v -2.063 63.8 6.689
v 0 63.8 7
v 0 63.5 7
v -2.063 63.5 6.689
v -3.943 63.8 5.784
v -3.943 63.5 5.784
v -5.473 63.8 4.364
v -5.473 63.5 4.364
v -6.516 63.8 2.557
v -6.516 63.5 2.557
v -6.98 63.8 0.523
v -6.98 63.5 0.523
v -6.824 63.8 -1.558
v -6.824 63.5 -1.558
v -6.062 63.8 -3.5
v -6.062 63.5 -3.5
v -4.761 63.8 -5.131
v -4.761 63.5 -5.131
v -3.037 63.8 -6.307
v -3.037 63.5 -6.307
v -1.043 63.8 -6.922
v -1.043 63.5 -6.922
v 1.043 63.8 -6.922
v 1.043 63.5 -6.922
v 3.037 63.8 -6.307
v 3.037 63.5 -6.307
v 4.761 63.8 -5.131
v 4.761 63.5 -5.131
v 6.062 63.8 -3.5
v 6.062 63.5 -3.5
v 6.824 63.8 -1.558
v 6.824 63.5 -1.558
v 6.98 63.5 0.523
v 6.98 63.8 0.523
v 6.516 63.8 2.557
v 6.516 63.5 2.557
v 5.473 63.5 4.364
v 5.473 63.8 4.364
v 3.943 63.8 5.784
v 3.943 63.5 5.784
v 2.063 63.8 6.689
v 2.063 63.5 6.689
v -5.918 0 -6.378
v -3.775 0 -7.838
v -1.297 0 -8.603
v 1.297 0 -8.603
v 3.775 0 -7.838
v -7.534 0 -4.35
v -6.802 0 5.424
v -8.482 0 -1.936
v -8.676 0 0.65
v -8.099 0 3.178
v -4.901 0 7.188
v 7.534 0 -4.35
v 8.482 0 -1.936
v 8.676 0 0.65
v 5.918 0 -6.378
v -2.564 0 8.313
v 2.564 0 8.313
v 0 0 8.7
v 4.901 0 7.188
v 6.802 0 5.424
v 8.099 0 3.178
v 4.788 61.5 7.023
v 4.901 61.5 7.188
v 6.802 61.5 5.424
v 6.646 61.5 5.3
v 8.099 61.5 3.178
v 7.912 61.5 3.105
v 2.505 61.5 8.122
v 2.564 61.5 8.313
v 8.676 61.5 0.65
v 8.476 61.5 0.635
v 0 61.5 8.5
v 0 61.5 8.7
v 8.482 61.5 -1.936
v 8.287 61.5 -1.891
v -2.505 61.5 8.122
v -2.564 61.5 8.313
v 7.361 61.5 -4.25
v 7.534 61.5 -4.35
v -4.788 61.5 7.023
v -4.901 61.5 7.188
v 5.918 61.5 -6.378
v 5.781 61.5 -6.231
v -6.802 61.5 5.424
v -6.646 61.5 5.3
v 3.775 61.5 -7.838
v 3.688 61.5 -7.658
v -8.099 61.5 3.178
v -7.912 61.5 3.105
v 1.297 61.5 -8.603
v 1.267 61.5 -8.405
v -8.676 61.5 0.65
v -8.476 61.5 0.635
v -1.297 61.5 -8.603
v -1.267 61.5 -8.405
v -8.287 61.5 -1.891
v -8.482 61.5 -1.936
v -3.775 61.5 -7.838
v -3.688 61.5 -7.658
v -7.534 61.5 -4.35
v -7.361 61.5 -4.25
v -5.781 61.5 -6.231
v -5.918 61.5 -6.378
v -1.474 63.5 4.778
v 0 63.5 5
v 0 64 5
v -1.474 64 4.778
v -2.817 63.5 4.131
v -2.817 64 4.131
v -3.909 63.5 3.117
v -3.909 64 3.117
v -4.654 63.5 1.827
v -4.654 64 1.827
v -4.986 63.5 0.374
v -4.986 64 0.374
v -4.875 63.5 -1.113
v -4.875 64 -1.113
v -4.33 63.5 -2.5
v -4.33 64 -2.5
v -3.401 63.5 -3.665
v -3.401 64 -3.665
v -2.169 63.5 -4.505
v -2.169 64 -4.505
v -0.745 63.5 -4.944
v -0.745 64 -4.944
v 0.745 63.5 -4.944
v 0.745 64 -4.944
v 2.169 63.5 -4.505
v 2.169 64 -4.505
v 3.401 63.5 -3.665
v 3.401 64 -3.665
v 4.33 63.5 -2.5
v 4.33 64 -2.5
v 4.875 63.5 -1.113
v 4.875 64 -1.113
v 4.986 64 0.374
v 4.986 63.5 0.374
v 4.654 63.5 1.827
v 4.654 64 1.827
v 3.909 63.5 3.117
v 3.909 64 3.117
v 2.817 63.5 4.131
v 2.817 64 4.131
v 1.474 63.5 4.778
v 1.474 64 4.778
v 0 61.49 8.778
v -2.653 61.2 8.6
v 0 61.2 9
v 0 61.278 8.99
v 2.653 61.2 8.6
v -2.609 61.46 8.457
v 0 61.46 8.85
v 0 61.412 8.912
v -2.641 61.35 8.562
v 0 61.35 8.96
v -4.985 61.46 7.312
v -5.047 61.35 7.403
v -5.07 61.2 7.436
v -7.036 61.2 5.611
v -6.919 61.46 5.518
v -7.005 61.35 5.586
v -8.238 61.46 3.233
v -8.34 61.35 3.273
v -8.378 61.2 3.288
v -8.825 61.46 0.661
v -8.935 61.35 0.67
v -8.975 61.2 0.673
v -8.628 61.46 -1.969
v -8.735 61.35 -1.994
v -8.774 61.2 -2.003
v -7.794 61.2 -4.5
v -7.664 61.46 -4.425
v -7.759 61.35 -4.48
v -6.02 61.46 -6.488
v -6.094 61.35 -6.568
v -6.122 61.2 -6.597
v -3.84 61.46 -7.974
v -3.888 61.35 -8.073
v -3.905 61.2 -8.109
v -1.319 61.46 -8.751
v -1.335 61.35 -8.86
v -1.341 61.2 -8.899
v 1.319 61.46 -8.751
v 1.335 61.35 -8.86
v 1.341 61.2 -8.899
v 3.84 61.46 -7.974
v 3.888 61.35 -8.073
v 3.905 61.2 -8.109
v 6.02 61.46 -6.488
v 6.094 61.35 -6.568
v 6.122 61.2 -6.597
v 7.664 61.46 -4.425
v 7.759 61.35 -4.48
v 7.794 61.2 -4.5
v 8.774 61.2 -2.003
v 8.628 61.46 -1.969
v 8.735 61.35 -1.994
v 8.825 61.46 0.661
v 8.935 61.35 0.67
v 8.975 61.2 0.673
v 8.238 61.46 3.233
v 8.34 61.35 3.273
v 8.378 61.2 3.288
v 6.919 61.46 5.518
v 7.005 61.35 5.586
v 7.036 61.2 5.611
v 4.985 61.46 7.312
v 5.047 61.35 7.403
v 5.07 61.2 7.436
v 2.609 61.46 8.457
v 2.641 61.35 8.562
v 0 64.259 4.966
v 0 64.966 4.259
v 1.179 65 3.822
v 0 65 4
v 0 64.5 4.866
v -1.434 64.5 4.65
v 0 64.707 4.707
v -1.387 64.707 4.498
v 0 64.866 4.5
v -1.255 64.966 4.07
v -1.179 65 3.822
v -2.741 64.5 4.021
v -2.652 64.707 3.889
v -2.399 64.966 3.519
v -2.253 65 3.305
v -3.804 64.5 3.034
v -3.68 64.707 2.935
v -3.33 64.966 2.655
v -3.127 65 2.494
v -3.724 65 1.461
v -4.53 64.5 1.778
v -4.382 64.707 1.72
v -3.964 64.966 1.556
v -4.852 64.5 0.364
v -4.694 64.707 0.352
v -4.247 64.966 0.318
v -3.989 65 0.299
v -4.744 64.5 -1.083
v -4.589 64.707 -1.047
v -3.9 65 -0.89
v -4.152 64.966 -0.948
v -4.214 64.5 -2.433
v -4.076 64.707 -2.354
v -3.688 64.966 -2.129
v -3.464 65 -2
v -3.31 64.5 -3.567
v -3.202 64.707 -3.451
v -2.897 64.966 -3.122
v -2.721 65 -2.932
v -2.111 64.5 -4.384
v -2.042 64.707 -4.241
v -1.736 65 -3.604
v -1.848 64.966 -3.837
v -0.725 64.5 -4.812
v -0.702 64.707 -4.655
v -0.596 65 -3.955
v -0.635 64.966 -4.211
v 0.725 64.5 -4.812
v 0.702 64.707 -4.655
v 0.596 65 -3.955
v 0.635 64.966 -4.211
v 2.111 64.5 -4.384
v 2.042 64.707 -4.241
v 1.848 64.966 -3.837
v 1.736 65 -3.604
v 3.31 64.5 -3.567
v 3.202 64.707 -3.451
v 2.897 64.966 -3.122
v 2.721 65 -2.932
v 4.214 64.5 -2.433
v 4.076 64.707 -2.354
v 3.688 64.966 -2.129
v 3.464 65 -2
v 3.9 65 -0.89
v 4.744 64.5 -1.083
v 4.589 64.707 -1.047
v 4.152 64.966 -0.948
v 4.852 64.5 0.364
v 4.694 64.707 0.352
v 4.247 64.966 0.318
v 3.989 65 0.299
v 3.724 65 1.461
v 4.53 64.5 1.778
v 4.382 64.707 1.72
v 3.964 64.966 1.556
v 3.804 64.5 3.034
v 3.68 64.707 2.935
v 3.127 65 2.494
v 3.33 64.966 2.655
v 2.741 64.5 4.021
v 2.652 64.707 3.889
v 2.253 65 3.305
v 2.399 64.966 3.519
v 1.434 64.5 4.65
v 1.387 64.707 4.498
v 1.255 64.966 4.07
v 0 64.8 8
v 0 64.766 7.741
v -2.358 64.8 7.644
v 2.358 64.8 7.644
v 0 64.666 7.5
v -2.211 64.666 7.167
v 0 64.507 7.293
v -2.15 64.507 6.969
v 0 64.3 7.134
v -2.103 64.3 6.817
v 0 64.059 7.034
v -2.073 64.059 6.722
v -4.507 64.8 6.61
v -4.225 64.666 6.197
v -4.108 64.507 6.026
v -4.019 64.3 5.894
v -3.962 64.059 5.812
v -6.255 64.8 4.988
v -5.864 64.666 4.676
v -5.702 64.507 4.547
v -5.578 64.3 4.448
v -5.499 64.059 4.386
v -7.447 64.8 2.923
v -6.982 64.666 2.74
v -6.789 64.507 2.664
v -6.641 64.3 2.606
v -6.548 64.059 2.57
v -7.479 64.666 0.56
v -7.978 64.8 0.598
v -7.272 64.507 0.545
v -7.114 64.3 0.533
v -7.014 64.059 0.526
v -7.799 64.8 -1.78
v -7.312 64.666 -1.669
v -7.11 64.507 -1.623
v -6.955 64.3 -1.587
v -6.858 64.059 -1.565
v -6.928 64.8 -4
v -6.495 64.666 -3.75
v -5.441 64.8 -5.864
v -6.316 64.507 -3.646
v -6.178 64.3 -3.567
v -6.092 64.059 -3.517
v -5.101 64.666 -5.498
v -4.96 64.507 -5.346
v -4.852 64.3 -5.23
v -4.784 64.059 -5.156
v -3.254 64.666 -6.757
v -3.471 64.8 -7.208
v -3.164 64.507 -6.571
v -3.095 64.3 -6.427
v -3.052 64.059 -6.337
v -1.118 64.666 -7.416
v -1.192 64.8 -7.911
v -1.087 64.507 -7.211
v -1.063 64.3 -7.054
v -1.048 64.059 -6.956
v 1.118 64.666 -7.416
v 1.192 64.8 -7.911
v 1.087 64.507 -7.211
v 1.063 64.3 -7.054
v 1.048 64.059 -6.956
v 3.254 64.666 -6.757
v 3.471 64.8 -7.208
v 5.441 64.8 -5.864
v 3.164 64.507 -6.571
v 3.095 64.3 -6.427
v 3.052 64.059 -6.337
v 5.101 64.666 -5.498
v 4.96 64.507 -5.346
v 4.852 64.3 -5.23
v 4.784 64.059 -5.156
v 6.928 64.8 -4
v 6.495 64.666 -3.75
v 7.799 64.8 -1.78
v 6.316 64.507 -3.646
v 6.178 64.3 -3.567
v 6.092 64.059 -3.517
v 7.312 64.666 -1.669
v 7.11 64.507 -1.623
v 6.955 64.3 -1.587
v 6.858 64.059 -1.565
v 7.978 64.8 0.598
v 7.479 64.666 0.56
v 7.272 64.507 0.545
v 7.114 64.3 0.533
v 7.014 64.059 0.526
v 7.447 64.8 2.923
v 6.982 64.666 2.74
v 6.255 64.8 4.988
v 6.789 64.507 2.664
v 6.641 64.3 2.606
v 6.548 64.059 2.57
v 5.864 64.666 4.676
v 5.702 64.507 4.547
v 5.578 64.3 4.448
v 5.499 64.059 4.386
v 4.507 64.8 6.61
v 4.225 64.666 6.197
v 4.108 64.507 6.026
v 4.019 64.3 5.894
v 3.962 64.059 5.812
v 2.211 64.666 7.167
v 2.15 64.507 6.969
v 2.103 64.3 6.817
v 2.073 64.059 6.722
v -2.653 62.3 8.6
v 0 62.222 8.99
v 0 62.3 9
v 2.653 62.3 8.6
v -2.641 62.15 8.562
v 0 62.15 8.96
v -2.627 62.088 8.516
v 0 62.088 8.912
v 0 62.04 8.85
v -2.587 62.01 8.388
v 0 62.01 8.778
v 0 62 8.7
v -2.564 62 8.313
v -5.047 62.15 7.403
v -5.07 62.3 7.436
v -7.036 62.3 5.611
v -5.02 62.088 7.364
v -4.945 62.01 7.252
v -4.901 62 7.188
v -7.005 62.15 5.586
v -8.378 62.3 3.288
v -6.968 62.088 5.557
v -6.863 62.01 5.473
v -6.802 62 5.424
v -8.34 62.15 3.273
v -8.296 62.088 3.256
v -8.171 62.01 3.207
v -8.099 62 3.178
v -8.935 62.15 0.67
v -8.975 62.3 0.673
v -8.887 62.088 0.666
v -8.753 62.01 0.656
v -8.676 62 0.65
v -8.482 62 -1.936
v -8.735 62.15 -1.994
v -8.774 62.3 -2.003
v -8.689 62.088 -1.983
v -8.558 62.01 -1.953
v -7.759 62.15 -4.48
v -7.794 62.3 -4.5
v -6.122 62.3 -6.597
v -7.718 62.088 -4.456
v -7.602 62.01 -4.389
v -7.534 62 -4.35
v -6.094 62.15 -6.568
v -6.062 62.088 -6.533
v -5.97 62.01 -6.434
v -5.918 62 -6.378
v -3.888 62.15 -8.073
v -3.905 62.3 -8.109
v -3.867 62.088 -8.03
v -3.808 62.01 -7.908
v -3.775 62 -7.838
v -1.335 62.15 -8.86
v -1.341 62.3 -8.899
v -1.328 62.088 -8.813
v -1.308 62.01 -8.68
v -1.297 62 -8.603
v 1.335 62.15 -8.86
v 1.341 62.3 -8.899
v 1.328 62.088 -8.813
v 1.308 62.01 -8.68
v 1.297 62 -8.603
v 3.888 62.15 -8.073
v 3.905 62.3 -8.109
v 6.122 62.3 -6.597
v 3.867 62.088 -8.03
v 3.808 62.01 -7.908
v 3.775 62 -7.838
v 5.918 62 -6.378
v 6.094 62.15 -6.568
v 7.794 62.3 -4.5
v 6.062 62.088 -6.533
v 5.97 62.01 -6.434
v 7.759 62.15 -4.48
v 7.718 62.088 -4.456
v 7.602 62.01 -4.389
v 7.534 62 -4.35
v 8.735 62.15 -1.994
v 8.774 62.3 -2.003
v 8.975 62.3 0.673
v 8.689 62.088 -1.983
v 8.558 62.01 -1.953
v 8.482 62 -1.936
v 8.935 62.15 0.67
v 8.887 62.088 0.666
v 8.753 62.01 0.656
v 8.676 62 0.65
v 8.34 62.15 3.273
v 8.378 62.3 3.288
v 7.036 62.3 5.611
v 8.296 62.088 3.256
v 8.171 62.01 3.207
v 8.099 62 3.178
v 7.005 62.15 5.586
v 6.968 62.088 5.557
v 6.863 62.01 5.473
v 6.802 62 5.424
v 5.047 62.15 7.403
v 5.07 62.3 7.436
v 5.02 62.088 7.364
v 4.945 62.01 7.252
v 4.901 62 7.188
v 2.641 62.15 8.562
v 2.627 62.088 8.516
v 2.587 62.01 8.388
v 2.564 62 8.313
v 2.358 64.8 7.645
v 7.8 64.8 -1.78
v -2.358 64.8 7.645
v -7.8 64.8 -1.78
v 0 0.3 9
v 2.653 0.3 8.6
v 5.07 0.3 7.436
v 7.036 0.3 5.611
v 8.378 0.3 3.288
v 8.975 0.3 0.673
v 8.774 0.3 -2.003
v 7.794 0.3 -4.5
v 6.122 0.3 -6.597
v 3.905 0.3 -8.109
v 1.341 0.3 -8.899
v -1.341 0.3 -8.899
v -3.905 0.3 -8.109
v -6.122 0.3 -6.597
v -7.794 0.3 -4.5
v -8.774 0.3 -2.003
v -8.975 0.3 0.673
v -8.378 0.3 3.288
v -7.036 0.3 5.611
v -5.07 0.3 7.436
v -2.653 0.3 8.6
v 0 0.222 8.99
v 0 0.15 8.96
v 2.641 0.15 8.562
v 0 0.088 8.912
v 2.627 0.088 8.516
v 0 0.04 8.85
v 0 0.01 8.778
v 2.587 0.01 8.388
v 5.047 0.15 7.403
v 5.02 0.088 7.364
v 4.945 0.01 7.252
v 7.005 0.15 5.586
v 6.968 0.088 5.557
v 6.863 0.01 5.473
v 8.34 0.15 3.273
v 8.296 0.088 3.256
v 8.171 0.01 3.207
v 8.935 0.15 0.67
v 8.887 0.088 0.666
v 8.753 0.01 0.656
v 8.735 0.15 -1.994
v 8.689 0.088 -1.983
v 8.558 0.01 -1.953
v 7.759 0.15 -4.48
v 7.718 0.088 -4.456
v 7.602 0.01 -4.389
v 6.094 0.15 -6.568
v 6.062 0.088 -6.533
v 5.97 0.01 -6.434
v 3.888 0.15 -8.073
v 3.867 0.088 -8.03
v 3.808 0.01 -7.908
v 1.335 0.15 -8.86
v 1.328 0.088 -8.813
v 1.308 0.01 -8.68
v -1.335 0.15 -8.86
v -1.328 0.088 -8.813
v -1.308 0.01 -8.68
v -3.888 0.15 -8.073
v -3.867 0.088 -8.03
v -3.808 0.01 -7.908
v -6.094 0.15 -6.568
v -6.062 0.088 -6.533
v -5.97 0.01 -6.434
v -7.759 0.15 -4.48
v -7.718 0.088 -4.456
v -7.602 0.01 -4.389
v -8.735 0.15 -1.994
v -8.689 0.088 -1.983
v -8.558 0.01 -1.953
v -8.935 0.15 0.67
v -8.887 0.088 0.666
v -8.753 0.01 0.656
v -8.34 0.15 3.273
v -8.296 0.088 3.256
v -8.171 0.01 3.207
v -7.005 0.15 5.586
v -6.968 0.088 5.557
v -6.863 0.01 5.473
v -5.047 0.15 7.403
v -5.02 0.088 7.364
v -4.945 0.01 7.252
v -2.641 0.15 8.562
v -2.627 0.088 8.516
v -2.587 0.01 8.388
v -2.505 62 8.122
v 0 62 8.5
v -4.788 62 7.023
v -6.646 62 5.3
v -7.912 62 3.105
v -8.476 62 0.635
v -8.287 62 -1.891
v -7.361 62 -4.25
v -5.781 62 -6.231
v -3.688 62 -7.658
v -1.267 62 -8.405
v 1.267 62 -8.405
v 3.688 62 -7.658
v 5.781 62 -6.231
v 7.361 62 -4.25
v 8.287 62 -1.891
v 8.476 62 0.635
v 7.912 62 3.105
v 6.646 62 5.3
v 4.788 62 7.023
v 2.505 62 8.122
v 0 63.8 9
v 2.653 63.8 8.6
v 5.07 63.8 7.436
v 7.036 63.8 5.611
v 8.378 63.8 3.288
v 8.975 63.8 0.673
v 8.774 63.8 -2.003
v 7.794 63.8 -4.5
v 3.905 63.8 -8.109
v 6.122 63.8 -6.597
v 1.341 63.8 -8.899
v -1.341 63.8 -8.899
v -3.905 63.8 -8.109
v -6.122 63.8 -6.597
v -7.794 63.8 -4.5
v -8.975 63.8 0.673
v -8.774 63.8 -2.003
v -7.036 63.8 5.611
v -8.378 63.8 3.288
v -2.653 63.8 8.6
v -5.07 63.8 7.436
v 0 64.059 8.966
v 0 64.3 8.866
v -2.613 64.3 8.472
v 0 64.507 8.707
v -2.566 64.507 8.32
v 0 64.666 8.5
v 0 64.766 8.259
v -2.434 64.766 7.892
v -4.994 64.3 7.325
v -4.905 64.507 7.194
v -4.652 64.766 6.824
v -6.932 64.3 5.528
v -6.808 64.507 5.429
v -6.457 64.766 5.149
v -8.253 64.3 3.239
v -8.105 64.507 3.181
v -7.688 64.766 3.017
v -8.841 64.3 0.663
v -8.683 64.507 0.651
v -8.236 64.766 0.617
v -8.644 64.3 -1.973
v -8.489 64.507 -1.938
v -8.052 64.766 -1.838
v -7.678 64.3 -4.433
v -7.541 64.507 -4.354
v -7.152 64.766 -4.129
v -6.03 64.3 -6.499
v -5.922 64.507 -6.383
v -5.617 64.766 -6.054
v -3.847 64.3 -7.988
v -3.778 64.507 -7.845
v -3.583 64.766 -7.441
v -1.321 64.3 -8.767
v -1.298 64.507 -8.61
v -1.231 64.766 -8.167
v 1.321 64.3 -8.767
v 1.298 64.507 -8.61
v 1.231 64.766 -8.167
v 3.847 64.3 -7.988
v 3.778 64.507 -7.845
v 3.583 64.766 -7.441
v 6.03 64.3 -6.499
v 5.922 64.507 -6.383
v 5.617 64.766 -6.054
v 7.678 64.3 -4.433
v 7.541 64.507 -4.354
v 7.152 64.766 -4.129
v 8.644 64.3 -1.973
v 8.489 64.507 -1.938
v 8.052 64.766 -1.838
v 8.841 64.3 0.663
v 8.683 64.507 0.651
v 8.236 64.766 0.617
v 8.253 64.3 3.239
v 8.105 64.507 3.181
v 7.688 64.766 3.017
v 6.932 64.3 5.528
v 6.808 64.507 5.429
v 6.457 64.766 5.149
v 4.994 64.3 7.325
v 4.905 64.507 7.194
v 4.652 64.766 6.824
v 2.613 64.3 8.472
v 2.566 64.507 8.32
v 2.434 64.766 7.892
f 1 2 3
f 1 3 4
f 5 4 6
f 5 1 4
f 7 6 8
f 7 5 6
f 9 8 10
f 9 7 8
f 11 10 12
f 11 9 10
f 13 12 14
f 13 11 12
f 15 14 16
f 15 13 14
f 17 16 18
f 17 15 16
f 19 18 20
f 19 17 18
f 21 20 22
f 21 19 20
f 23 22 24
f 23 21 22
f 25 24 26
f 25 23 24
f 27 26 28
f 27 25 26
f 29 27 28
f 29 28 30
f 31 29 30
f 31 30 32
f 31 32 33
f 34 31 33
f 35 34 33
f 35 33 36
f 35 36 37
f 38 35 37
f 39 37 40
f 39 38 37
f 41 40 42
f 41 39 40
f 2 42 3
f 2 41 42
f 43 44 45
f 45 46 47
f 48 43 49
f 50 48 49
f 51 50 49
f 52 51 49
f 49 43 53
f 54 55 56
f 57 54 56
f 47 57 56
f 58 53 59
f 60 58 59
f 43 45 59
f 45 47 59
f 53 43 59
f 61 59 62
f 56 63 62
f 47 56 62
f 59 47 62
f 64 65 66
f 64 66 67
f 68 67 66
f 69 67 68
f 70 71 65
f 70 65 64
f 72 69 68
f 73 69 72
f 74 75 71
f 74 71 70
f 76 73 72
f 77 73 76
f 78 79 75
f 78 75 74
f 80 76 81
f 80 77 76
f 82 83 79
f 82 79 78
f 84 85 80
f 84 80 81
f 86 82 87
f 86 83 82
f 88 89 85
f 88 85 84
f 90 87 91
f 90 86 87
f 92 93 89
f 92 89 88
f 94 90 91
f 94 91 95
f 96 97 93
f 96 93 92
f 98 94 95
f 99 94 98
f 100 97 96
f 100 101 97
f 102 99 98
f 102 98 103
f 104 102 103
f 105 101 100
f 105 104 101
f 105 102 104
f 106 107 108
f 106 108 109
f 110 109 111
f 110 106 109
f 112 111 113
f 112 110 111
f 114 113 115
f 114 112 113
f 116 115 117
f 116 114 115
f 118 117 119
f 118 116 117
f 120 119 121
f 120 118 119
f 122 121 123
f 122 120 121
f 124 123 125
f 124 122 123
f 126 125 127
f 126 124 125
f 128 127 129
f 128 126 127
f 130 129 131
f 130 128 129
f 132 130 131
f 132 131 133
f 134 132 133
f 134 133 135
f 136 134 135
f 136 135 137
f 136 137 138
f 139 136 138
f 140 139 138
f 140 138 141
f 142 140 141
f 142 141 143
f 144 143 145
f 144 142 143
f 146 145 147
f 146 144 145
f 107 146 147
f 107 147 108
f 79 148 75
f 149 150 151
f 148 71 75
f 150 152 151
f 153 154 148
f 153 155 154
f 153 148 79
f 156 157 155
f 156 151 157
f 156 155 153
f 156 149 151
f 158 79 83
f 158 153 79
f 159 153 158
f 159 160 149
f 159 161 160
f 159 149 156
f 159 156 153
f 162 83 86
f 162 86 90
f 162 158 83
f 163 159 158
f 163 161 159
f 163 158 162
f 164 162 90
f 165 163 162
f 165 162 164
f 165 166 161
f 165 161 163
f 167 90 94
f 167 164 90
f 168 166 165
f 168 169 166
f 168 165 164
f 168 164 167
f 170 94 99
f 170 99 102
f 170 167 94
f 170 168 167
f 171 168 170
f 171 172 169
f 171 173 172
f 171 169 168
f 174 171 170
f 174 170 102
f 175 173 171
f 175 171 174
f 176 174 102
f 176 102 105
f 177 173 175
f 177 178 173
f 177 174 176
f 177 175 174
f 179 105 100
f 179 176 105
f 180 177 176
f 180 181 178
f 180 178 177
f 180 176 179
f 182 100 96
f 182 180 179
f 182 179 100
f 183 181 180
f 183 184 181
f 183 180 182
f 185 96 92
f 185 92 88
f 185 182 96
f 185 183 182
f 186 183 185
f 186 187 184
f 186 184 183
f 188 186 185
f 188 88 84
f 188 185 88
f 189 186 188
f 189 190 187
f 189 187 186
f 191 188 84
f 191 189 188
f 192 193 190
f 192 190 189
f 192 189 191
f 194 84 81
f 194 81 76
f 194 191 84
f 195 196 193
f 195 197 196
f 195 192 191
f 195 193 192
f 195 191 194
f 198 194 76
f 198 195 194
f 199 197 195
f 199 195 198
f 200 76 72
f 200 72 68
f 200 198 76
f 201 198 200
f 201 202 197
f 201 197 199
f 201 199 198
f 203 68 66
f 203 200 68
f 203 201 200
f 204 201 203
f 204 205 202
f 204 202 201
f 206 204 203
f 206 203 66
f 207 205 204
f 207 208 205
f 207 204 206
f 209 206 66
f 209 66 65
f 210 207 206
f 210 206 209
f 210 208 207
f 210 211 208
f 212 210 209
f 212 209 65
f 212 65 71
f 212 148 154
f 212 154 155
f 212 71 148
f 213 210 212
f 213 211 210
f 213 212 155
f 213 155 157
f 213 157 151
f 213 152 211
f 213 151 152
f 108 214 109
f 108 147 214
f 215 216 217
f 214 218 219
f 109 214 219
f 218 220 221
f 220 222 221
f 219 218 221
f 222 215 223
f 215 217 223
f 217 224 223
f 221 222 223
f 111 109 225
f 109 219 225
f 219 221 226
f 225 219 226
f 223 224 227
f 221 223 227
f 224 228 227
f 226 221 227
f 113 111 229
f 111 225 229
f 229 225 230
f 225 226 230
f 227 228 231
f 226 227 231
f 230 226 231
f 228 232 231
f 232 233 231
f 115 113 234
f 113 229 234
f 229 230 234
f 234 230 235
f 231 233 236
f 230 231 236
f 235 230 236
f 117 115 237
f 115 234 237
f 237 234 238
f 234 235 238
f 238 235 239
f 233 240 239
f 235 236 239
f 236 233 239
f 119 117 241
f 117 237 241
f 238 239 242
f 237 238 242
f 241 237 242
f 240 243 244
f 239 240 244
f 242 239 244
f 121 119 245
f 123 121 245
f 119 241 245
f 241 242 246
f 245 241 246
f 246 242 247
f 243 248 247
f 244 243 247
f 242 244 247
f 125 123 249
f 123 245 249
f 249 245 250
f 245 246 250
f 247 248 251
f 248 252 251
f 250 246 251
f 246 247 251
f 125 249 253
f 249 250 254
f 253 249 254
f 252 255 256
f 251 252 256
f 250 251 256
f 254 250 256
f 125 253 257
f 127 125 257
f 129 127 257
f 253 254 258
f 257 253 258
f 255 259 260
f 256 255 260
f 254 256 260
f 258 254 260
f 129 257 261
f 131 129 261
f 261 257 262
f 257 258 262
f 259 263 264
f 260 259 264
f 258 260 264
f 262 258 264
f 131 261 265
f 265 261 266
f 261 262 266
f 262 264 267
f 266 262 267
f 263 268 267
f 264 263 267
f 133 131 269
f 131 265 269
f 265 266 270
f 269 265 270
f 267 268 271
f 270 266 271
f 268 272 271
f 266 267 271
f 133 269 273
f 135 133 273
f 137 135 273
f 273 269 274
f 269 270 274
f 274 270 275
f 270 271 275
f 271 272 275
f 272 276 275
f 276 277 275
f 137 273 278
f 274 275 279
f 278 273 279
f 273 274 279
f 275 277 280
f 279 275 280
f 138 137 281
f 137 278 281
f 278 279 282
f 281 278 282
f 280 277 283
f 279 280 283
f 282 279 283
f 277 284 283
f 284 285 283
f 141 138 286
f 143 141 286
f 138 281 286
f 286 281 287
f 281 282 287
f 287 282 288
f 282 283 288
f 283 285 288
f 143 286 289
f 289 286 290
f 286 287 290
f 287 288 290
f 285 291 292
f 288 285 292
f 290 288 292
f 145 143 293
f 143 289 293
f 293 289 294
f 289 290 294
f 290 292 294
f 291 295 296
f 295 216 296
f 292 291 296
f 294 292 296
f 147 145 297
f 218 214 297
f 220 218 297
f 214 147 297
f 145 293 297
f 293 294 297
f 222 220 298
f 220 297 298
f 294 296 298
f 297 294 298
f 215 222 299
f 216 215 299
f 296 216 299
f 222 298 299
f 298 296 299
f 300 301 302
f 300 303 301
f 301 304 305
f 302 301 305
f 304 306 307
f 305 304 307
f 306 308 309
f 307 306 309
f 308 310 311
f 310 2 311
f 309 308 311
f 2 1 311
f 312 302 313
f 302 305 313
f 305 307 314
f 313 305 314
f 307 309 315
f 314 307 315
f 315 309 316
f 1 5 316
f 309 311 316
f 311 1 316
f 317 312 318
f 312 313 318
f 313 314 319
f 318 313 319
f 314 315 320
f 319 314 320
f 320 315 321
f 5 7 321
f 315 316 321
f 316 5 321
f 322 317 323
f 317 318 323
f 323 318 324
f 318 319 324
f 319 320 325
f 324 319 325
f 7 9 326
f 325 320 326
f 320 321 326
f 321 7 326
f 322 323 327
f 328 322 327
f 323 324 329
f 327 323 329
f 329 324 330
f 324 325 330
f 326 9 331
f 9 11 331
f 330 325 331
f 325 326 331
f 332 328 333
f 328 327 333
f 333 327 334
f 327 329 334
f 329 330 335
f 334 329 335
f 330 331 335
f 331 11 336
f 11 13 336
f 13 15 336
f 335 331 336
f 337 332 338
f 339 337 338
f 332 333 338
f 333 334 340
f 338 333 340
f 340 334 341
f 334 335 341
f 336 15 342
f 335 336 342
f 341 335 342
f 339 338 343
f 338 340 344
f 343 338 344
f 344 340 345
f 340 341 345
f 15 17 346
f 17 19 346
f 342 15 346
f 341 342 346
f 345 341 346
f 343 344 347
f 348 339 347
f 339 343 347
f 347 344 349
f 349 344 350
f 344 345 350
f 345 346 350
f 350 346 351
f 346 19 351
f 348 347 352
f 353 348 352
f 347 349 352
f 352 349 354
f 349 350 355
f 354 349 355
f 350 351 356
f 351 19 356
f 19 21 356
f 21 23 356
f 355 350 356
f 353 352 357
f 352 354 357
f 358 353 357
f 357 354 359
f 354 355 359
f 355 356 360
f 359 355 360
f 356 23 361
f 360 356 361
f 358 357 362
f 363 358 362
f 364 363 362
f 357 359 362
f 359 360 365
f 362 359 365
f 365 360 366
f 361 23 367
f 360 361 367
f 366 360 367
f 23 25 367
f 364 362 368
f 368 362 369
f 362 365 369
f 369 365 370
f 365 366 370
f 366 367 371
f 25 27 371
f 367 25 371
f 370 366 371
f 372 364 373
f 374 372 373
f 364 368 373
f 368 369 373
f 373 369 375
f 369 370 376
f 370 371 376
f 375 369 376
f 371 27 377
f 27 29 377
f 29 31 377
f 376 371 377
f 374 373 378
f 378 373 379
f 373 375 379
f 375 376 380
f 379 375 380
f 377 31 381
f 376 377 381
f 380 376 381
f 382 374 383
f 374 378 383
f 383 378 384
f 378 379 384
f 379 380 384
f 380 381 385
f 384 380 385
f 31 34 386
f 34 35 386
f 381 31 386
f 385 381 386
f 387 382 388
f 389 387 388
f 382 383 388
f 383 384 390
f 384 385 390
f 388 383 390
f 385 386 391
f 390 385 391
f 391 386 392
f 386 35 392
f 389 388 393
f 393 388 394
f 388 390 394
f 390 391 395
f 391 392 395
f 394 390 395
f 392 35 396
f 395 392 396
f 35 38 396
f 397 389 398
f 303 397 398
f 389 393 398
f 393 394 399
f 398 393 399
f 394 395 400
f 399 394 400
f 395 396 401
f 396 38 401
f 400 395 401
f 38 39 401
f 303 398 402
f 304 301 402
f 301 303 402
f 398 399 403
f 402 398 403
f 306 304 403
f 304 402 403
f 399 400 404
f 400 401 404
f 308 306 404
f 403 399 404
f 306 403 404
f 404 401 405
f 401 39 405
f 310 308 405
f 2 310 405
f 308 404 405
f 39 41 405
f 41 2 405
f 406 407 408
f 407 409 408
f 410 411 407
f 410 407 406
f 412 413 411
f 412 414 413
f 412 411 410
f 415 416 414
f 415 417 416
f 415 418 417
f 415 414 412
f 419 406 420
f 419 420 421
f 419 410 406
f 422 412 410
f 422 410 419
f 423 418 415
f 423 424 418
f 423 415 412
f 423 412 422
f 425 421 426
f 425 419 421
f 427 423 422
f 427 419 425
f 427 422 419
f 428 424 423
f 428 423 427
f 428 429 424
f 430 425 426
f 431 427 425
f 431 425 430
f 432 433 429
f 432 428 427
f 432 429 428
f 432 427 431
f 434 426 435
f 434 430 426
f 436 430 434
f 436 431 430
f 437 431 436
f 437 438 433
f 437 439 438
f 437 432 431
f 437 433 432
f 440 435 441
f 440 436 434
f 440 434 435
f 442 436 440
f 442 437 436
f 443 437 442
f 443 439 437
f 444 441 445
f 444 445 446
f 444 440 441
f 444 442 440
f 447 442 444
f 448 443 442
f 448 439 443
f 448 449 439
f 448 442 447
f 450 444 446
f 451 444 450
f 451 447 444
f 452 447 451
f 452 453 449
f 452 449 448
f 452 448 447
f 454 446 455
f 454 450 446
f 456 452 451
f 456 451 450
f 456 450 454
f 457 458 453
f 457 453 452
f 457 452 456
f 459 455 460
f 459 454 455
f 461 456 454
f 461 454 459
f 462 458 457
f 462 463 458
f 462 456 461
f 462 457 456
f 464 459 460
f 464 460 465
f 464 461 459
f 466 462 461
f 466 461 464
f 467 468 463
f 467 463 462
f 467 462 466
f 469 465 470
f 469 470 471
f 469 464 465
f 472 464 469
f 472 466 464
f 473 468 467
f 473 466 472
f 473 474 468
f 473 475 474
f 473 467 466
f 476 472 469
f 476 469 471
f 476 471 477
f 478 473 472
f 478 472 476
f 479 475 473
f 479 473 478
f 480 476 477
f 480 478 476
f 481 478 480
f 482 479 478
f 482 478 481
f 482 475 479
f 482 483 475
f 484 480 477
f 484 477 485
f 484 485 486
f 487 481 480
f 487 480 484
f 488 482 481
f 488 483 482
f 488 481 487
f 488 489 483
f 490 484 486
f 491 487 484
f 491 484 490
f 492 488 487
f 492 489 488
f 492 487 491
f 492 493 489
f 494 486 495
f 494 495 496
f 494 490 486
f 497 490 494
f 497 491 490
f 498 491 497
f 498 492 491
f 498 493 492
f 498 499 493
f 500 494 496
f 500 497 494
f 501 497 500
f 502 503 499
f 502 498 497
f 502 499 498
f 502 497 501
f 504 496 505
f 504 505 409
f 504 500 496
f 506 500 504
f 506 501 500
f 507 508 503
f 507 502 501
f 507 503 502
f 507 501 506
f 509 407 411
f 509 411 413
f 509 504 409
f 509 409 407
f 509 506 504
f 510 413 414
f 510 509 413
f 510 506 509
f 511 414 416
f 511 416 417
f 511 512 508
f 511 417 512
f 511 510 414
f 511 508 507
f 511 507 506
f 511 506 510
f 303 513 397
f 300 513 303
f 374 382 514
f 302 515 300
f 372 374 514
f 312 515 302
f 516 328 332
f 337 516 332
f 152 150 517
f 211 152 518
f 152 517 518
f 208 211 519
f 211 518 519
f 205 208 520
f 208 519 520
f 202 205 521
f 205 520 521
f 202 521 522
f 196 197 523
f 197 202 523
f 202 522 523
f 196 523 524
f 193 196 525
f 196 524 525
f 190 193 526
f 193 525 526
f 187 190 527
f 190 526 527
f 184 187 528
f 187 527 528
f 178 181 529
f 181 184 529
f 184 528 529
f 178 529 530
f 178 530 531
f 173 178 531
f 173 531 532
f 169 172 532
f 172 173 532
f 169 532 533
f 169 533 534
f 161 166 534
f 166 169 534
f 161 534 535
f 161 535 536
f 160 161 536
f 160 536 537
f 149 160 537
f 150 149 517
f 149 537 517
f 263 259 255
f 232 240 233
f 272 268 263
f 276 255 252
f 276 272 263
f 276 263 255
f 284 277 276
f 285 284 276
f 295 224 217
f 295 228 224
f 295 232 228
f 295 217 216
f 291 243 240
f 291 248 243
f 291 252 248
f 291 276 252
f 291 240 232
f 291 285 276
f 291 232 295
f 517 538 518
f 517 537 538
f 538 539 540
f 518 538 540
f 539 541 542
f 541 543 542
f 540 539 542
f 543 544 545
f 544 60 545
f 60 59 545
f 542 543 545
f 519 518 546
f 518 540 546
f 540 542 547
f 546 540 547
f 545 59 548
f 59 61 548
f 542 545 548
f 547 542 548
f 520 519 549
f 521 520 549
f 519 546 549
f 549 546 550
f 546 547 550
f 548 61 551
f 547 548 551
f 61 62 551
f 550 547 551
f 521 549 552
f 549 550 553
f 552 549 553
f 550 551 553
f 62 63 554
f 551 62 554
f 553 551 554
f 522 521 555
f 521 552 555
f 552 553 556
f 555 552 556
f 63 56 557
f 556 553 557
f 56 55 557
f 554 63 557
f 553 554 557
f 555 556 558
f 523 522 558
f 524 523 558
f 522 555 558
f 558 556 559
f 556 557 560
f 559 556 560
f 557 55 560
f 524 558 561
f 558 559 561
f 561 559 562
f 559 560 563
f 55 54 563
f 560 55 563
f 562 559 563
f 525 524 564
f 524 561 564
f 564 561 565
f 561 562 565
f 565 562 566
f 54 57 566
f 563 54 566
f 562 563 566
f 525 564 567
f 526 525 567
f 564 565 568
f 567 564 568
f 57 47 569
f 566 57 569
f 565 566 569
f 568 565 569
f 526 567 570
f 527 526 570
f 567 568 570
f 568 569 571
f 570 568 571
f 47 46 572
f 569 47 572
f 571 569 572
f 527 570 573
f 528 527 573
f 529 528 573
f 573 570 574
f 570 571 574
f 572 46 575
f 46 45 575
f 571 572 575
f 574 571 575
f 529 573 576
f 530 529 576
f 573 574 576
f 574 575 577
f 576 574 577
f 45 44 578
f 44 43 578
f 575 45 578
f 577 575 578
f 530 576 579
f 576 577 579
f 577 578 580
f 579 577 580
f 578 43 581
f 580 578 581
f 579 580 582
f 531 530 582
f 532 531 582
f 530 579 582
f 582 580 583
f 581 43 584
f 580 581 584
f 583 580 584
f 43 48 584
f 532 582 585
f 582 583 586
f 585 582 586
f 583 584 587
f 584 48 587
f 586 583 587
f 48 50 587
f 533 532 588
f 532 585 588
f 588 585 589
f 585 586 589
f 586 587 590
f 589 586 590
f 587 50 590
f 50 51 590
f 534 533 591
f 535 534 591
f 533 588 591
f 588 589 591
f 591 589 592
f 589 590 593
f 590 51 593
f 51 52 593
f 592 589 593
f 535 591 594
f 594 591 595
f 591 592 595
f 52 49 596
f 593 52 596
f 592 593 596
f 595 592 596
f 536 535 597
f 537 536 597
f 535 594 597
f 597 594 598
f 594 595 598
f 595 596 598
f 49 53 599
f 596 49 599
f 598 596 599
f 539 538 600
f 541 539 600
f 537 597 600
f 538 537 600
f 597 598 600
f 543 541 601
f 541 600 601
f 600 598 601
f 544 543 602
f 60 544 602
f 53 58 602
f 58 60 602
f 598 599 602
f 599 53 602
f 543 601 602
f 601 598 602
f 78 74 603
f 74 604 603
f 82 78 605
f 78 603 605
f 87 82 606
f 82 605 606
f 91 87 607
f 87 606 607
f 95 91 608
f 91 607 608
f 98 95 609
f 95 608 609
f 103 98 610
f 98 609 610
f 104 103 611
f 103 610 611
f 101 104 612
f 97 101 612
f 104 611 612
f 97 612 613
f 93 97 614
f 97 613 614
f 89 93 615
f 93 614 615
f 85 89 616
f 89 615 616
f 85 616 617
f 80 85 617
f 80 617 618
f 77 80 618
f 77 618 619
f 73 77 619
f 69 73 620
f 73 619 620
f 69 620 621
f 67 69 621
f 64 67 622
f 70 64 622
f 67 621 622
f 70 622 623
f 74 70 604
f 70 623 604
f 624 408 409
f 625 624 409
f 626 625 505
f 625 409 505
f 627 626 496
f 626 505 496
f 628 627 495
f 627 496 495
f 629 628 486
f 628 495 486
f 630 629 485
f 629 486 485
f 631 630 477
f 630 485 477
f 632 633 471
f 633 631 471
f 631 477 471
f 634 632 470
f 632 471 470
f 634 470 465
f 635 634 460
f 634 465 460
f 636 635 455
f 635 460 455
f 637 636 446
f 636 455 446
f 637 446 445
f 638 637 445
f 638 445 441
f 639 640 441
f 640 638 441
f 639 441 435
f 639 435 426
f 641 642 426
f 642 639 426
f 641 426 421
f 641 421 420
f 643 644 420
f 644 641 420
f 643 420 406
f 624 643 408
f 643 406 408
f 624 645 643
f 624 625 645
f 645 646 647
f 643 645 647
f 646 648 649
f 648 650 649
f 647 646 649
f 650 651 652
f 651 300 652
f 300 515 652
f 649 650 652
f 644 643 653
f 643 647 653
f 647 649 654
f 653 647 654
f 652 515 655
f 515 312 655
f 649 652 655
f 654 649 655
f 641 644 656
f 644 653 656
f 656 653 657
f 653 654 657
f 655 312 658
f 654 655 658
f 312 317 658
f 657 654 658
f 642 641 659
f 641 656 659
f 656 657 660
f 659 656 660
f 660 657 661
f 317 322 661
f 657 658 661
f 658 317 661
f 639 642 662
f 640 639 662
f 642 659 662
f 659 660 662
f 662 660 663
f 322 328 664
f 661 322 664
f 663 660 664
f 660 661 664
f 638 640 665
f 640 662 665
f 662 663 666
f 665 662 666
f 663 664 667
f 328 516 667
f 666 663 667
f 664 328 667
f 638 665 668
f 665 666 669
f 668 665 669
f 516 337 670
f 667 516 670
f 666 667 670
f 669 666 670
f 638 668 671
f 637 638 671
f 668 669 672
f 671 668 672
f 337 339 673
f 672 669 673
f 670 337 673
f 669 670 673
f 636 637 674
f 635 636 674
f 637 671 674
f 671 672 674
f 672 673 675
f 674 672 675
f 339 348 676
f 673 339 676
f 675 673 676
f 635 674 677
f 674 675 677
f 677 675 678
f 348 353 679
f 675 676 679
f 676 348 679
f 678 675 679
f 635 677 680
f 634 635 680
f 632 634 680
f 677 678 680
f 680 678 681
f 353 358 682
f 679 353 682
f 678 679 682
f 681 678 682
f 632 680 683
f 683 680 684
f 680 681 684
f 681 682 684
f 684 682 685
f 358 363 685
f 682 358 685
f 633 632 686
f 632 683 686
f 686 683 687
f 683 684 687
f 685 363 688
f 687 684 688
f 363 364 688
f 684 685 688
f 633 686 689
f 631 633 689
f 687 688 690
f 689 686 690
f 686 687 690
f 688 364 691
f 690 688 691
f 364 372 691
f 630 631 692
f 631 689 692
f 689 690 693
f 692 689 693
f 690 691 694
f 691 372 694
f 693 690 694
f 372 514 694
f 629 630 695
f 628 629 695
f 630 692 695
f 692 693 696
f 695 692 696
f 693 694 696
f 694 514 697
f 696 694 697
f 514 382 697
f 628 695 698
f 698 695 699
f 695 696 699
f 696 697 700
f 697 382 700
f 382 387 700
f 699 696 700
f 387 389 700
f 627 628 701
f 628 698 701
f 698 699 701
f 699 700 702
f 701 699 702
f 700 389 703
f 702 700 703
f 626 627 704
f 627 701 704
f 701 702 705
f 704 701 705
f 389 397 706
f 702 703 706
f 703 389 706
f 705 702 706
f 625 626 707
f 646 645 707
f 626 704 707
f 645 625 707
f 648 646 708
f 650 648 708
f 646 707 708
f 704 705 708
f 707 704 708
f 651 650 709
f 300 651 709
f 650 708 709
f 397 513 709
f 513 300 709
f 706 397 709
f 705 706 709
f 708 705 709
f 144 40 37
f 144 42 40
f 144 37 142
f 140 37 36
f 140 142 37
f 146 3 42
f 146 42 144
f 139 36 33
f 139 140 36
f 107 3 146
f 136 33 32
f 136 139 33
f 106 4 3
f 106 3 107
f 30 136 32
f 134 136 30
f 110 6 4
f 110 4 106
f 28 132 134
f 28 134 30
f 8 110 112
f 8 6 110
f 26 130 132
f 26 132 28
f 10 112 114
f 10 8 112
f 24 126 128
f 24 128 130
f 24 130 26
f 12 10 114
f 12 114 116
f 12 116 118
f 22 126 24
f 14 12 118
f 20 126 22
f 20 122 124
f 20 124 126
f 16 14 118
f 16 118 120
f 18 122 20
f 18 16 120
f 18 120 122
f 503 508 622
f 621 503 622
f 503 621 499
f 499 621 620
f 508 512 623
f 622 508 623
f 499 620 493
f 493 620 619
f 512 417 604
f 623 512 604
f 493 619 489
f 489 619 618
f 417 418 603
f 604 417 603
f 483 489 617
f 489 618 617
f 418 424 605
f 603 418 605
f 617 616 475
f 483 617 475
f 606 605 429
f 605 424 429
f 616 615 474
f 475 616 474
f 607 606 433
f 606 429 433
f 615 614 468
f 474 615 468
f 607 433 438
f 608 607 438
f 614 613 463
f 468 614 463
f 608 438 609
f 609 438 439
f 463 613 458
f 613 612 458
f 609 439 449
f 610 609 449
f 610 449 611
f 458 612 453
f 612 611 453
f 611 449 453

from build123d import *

# Parameters (mm, degrees)
SKETCH1_R           = 9
BOSS_EXTRUDE1_DEPTH = 65
SKETCH2_W           = 0.5
SKETCH2_H           = 0.5
FILLET1_R           = 1
FILLET2_R           = 0.3


with BuildPart() as part:
    # Sketch1 → Boss-Extrude1 (new body)
    with BuildSketch(Plane(origin=(0, 0, 0), x_dir=(1, 0, 0), z_dir=(0, 1, 0))):
        with Locations(Location((0, 0, 0), (0, 0, 270))):
            Circle(SKETCH1_R)
    extrude(amount=BOSS_EXTRUDE1_DEPTH)

    # Sketch2 → Cut-Revolve1 (revolve, cut)
    with BuildSketch(Plane.XY, mode=Mode.PRIVATE) as cut_revolve1_sk:
        Polygon((5, 65), (5, 63.5), (7, 63.5), (7, 64.8), (9, 64.8), (9, 65), align=None)
        with Locations((8.75, 61.75)):
            Rectangle(SKETCH2_W, SKETCH2_H)
    revolve(cut_revolve1_sk.sketch.rotate(Axis((0, 65, 0), (0, -1, 0)), 90), axis=Axis((0, 65, 0), (0, -1, 0)), mode=Mode.SUBTRACT)

    # Fillet1
    fillet1_edges = [part.edges().sort_by_distance(p)[0] for p in [
        (0, 65, -5),
        (0, 64.8, -7),
        (0, 64.8, -9),
    ]]
    fillet(fillet1_edges, radius=FILLET1_R - 0.0001)  # a hair under: the kernel refuses the full size

    # Fillet2
    fillet2_edges = [part.edges().sort_by_distance(p)[0] for p in [
        (0, 61.5, -9),
        (0, 62, -9),
        (0, 0, -9),
    ]]
    fillet(fillet2_edges, radius=FILLET2_R)


solid = part.part
